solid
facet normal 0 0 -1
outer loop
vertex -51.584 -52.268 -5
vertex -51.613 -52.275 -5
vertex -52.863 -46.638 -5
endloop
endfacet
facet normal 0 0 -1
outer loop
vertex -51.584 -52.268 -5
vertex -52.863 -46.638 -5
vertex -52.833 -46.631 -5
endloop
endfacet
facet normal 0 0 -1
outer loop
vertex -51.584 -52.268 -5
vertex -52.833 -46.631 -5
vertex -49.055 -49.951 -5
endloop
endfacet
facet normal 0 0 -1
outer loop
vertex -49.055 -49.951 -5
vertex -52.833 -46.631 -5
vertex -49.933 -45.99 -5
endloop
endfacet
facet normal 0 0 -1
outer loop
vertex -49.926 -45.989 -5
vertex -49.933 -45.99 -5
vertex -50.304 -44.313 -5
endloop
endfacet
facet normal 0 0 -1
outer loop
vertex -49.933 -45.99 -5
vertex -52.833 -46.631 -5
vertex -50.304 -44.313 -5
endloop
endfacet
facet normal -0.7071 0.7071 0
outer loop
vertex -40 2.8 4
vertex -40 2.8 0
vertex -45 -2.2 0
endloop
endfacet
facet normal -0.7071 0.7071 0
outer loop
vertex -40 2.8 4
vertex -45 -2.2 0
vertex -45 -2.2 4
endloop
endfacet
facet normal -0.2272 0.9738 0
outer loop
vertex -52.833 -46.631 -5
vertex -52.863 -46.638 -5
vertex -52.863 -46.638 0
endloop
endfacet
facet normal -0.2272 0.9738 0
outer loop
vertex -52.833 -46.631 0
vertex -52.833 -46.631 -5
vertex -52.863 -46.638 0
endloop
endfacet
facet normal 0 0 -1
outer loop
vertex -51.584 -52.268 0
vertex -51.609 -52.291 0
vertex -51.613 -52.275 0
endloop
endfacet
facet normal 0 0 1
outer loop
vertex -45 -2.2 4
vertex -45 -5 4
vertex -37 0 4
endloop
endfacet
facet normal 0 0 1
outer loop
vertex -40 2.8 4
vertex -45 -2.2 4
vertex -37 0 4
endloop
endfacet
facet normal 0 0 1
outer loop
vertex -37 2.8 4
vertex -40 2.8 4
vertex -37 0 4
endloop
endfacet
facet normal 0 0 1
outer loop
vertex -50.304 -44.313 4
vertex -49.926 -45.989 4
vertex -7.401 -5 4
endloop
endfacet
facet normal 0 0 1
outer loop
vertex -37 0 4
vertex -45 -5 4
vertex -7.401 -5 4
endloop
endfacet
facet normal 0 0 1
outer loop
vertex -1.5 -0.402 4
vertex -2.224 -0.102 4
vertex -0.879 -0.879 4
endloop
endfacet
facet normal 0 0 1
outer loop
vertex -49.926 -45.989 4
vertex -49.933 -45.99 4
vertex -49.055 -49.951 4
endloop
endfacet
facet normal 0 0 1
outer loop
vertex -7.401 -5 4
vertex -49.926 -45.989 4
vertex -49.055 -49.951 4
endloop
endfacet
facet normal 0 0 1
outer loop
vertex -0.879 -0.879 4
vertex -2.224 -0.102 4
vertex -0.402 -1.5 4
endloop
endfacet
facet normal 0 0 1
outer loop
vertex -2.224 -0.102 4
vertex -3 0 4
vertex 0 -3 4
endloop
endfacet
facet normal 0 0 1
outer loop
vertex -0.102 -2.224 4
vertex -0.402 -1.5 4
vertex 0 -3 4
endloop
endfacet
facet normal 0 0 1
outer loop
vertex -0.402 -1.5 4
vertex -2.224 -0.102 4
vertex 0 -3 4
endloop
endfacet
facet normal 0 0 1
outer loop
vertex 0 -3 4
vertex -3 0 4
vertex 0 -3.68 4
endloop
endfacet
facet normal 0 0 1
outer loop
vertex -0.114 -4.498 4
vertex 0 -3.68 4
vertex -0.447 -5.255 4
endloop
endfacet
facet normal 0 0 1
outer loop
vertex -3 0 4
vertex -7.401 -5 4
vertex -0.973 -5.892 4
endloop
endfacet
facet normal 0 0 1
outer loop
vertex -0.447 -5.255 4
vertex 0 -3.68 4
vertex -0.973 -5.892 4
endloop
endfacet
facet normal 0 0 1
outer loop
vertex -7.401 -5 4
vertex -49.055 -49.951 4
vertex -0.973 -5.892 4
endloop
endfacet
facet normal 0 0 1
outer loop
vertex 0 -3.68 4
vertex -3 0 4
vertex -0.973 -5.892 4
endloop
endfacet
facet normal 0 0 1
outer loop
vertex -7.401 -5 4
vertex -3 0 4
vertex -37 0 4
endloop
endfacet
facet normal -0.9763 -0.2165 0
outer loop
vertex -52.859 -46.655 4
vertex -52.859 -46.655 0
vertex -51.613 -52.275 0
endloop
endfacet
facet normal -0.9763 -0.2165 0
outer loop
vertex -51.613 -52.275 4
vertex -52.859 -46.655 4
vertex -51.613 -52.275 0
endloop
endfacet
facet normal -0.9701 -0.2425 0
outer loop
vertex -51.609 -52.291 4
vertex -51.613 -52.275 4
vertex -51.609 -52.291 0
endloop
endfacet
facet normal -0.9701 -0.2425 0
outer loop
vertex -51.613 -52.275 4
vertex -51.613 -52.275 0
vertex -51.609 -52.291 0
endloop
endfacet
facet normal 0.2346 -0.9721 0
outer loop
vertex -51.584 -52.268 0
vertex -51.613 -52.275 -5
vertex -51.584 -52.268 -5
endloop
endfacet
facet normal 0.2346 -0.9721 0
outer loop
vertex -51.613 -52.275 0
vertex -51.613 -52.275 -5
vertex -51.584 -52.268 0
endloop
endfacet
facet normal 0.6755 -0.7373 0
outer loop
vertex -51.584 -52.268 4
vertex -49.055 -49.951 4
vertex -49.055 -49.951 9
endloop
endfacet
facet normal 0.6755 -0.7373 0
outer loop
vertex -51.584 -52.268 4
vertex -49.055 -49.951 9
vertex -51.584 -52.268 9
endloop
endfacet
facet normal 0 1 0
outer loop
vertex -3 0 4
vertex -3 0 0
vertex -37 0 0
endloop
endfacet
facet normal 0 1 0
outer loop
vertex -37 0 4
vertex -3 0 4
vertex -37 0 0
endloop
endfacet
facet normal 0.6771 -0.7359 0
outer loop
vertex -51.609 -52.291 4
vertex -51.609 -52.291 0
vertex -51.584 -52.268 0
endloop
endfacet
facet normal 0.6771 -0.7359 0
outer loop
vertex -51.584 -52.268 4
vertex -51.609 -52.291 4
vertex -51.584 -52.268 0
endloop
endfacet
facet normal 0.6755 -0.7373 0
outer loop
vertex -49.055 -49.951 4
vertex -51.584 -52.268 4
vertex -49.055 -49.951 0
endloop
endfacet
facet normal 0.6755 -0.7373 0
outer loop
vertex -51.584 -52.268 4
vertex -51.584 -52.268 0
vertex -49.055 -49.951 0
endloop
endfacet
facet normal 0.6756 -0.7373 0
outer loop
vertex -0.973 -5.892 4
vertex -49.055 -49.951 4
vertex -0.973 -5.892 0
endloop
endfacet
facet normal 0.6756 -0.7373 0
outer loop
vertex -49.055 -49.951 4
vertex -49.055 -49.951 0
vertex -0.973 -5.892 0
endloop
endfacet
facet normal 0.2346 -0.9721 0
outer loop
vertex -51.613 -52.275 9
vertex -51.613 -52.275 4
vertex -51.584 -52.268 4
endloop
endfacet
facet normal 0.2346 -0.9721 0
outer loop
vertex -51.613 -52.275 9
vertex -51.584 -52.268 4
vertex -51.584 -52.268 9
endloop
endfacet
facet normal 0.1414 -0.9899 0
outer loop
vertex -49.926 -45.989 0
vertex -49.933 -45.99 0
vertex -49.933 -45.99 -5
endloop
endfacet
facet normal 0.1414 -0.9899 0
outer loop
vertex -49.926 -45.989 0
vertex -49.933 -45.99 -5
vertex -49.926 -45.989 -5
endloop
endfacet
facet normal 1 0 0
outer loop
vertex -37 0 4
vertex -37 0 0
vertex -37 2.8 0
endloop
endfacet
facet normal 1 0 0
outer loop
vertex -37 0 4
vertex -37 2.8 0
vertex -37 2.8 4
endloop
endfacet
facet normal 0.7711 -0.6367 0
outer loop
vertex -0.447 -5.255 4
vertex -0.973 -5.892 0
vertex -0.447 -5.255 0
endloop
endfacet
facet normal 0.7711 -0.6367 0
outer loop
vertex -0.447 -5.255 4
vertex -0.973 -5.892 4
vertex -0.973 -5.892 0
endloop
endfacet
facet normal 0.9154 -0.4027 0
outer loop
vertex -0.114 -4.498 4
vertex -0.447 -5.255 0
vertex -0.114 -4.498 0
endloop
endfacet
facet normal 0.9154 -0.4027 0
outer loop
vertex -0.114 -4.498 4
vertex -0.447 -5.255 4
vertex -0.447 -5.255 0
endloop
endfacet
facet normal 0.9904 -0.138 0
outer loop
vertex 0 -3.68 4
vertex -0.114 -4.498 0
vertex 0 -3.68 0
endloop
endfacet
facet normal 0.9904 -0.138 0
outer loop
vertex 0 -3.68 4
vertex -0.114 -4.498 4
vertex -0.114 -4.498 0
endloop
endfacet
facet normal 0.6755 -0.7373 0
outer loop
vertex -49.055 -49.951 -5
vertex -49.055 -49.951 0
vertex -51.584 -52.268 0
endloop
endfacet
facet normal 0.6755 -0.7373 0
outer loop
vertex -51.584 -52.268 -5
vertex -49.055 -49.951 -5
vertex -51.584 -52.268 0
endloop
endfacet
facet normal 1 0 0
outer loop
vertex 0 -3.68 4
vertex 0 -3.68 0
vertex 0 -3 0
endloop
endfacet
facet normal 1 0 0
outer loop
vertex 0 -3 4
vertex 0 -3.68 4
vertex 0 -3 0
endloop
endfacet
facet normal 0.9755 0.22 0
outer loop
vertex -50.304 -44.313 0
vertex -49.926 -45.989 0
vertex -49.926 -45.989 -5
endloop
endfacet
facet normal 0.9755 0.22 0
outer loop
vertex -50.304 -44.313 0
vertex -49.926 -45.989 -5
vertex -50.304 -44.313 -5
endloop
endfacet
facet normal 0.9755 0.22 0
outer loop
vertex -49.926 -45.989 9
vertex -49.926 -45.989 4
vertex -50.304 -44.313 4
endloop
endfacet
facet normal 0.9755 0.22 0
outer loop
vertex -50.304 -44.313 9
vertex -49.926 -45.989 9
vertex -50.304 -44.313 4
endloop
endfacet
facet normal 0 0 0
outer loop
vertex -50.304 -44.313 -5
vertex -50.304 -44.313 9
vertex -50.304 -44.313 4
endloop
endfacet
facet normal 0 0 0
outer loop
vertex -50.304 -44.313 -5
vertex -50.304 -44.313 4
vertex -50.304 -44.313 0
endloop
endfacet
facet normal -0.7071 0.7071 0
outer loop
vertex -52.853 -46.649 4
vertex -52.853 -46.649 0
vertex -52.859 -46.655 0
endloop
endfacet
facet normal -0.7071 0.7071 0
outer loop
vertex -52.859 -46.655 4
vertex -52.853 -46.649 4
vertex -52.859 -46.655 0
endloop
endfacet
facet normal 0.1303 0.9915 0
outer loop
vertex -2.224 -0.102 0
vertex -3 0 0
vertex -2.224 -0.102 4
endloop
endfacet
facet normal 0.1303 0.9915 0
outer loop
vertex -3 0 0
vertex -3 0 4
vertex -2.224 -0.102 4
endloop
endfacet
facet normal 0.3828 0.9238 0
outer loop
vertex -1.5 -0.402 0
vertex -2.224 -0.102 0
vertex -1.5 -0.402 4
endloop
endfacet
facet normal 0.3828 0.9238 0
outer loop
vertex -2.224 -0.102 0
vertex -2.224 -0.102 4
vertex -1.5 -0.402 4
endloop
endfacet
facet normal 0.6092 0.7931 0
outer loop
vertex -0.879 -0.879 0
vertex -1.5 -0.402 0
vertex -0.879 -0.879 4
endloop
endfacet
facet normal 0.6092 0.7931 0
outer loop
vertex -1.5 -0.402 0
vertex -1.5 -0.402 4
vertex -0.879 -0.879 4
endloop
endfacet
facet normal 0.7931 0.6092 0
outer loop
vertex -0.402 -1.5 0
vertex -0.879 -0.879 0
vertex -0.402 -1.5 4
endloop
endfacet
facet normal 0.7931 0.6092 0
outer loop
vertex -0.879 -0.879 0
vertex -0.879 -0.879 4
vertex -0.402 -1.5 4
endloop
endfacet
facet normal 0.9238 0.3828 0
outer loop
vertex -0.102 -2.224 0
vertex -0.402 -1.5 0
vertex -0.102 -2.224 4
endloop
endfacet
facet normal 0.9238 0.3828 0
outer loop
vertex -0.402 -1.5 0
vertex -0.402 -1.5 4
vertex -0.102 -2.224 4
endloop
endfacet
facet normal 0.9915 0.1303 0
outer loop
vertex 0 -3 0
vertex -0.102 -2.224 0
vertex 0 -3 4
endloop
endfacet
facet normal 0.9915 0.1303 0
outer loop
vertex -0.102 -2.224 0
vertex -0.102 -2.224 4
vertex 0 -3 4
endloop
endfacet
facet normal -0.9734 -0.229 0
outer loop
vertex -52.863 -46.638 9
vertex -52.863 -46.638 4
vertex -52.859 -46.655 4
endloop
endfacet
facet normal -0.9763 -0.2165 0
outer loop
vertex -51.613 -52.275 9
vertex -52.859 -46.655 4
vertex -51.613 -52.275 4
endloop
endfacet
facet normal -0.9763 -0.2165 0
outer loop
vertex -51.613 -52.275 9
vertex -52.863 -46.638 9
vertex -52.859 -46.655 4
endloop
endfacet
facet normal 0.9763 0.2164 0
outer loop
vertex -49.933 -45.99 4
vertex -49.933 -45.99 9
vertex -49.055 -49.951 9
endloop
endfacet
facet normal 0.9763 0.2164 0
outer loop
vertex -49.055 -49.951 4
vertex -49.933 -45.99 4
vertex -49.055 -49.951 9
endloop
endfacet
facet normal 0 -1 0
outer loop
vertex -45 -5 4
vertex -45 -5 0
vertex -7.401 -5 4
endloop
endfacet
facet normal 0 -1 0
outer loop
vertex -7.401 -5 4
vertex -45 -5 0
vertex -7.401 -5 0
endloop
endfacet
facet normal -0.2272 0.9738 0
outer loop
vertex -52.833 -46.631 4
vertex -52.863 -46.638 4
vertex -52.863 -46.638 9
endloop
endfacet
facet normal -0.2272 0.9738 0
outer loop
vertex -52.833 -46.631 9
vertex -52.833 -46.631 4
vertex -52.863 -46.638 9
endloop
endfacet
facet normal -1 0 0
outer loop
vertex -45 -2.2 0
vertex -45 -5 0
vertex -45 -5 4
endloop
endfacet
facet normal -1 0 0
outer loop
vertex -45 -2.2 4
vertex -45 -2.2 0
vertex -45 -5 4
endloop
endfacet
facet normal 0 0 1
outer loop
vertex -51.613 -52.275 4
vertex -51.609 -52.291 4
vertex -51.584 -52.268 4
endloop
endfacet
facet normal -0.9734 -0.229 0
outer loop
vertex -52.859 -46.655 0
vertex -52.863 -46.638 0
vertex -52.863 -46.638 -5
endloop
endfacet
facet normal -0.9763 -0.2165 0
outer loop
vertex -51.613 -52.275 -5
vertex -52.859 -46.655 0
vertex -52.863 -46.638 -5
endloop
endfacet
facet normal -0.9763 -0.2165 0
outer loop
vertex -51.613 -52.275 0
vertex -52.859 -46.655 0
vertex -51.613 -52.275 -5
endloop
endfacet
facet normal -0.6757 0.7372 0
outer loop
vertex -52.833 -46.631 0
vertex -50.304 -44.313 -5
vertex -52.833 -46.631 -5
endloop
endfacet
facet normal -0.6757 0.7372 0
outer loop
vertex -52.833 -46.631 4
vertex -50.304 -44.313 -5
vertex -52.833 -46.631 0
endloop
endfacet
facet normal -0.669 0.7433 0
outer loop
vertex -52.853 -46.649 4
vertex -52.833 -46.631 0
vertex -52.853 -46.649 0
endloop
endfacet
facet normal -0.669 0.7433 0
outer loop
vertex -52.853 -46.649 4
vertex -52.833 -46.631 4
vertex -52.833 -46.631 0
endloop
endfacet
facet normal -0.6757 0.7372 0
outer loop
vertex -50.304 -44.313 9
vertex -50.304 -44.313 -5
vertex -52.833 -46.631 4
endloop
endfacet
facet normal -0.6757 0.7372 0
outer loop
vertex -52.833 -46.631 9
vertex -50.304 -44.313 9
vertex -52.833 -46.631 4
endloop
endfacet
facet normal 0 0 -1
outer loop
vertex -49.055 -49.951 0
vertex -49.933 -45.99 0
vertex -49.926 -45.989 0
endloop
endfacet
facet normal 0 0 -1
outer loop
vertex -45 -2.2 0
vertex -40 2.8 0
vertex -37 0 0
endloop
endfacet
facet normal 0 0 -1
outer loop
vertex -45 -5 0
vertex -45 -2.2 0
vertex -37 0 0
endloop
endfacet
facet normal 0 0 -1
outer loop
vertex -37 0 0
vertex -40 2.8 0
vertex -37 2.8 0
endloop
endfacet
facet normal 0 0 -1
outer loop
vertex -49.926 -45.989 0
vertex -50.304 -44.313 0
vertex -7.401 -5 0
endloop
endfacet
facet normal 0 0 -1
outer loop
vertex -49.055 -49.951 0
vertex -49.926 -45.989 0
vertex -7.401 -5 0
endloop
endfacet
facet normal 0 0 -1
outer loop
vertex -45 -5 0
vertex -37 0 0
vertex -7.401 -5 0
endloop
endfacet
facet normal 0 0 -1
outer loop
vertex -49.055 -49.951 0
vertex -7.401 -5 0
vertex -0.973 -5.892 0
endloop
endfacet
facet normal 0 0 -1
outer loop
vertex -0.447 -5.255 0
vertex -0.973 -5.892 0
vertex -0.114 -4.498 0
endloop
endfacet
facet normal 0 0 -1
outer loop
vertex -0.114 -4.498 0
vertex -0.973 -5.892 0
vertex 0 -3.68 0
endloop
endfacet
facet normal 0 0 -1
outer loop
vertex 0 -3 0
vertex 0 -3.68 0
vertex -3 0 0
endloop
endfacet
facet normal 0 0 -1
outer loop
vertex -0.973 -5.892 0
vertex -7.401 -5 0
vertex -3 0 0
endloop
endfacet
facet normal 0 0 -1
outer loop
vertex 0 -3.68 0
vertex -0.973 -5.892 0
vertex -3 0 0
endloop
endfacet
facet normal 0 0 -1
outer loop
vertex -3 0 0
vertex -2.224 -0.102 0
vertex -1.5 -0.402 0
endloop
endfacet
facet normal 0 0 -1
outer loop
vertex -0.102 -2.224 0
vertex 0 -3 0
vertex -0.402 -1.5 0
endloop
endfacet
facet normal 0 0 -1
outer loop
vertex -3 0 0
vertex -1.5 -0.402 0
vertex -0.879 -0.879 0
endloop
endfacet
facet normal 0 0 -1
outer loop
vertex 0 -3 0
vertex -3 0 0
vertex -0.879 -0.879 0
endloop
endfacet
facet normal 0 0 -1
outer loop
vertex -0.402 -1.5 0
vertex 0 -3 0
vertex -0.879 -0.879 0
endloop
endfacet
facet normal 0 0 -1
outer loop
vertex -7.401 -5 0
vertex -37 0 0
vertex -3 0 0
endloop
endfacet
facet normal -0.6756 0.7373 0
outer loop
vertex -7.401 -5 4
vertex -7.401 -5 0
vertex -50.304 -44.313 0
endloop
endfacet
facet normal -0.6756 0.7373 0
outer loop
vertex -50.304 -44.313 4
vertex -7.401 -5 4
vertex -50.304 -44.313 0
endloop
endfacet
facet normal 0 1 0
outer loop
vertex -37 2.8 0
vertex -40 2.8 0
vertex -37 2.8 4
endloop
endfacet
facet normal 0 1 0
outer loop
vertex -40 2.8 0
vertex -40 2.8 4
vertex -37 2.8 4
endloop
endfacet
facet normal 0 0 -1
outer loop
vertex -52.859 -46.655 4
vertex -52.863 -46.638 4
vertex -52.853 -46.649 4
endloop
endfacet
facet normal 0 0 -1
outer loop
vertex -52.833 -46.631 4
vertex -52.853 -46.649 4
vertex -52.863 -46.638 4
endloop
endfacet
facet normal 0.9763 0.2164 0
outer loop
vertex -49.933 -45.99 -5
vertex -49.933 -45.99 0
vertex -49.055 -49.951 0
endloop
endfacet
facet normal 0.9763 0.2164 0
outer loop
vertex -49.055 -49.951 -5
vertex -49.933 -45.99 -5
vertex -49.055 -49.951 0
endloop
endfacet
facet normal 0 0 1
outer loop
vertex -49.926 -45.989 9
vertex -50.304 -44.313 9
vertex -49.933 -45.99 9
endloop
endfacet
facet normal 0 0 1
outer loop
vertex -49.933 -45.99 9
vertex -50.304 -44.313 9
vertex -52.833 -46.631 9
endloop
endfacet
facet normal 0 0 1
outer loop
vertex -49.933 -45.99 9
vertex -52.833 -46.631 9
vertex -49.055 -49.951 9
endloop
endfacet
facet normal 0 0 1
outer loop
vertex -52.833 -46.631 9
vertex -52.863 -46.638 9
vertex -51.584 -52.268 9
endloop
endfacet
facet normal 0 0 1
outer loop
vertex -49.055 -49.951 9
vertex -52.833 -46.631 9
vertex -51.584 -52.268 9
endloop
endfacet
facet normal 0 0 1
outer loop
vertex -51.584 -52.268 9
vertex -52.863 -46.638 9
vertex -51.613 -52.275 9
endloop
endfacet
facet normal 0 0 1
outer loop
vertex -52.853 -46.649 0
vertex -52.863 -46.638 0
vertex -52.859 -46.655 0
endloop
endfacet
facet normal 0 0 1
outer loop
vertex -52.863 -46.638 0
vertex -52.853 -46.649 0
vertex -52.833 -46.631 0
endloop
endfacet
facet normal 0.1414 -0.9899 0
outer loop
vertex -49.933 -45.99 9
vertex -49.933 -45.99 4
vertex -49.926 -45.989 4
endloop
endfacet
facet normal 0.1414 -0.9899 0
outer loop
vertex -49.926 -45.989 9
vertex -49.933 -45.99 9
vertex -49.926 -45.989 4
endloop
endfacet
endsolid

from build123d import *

# Parameters (mm, degrees)
F0_W           = 5
F0_H           = 5
F1_DEPTH       = 4
F2_R           = 3
F3_W           = 8
F3_H           = 4
F4_DEPTH       = 2.8
F5_SIZE        = 5
F7_W           = 5.774
F7_H           = 5
F8_DEPTH       = 3
F10_DEPTH      = 25
F10_DEPTH_BACK = 25
F11_DEPTH      = 9
F11_DEPTH_BACK = 5


with BuildPart() as f1:
    # F0 (on Top) → F1 (new body)
    with BuildSketch(Plane.XY):
        Polygon((0, 0), (-40, 0), (-40, -5), (-7.4009361646, -5), (0, -5), align=None)
        Polygon((-51.6094135767, -52.2913145331), (0, -5), (-7.4009361646, -5), (-52.8590282704, -46.6546669079), align=None)
        with Locations((-42.5, -2.5)):
            Rectangle(F0_W, F0_H)
    extrude(amount=F1_DEPTH)

    # F2
    f2_edges = [f1.edges().sort_by_distance(p)[0] for p in [
        (0, 0, 2),
        (0, -5, 2),
    ]]
    fillet(f2_edges, radius=F2_R)

    # F3 (on Front) → F4 (join)
    with BuildSketch(Plane.XZ):
        with Locations((-41, 2)):
            Rectangle(F3_W, F3_H)
    extrude(amount=-F4_DEPTH)

    # F5
    f5_edges = [f1.edges().sort_by_distance(p)[0] for p in [
        (-45, 2.8, 2),
    ]]
    chamfer(f5_edges, length=F5_SIZE)

    # F7 (on offset) → F8 (join)
    with BuildSketch(Plane(origin=(-60.2413457189, -13.3551848163, 0), x_dir=(0.2164396139, -0.9762960071, 0), z_dir=(-0.9762960071, -0.2164396139, 0))):
        with Locations((36.9775523019, 6.5)):
            Rectangle(F7_W, F7_H)
        with Locations((36.9775523019, -2.5)):
            Rectangle(F7_W, F7_H)
    extrude(amount=-F8_DEPTH)

    # F9 (on Top) → F10 (cut, two sides)
    with BuildSketch(Plane.XY) as f10_sk:
        Polygon((-48.0777584016, -51.715362817), (-48.6127237734, -49.5453542475), (-51.6094135767, -52.2913145331), align=None)
    extrude(amount=F10_DEPTH, mode=Mode.SUBTRACT)
    extrude(f10_sk.sketch, amount=-F10_DEPTH_BACK, mode=Mode.SUBTRACT)

    # F9 (on Top) → F11 (join, two sides)
    with BuildSketch(Plane.XY) as f11_sk:
        Polygon((-49.9261649251, -45.9886011426), (-50.3040521353, -44.313404132), (-52.8526316454, -46.6487469866), align=None)
    extrude(amount=F11_DEPTH)
    extrude(f11_sk.sketch, amount=-F11_DEPTH_BACK)


solid = f1.part
